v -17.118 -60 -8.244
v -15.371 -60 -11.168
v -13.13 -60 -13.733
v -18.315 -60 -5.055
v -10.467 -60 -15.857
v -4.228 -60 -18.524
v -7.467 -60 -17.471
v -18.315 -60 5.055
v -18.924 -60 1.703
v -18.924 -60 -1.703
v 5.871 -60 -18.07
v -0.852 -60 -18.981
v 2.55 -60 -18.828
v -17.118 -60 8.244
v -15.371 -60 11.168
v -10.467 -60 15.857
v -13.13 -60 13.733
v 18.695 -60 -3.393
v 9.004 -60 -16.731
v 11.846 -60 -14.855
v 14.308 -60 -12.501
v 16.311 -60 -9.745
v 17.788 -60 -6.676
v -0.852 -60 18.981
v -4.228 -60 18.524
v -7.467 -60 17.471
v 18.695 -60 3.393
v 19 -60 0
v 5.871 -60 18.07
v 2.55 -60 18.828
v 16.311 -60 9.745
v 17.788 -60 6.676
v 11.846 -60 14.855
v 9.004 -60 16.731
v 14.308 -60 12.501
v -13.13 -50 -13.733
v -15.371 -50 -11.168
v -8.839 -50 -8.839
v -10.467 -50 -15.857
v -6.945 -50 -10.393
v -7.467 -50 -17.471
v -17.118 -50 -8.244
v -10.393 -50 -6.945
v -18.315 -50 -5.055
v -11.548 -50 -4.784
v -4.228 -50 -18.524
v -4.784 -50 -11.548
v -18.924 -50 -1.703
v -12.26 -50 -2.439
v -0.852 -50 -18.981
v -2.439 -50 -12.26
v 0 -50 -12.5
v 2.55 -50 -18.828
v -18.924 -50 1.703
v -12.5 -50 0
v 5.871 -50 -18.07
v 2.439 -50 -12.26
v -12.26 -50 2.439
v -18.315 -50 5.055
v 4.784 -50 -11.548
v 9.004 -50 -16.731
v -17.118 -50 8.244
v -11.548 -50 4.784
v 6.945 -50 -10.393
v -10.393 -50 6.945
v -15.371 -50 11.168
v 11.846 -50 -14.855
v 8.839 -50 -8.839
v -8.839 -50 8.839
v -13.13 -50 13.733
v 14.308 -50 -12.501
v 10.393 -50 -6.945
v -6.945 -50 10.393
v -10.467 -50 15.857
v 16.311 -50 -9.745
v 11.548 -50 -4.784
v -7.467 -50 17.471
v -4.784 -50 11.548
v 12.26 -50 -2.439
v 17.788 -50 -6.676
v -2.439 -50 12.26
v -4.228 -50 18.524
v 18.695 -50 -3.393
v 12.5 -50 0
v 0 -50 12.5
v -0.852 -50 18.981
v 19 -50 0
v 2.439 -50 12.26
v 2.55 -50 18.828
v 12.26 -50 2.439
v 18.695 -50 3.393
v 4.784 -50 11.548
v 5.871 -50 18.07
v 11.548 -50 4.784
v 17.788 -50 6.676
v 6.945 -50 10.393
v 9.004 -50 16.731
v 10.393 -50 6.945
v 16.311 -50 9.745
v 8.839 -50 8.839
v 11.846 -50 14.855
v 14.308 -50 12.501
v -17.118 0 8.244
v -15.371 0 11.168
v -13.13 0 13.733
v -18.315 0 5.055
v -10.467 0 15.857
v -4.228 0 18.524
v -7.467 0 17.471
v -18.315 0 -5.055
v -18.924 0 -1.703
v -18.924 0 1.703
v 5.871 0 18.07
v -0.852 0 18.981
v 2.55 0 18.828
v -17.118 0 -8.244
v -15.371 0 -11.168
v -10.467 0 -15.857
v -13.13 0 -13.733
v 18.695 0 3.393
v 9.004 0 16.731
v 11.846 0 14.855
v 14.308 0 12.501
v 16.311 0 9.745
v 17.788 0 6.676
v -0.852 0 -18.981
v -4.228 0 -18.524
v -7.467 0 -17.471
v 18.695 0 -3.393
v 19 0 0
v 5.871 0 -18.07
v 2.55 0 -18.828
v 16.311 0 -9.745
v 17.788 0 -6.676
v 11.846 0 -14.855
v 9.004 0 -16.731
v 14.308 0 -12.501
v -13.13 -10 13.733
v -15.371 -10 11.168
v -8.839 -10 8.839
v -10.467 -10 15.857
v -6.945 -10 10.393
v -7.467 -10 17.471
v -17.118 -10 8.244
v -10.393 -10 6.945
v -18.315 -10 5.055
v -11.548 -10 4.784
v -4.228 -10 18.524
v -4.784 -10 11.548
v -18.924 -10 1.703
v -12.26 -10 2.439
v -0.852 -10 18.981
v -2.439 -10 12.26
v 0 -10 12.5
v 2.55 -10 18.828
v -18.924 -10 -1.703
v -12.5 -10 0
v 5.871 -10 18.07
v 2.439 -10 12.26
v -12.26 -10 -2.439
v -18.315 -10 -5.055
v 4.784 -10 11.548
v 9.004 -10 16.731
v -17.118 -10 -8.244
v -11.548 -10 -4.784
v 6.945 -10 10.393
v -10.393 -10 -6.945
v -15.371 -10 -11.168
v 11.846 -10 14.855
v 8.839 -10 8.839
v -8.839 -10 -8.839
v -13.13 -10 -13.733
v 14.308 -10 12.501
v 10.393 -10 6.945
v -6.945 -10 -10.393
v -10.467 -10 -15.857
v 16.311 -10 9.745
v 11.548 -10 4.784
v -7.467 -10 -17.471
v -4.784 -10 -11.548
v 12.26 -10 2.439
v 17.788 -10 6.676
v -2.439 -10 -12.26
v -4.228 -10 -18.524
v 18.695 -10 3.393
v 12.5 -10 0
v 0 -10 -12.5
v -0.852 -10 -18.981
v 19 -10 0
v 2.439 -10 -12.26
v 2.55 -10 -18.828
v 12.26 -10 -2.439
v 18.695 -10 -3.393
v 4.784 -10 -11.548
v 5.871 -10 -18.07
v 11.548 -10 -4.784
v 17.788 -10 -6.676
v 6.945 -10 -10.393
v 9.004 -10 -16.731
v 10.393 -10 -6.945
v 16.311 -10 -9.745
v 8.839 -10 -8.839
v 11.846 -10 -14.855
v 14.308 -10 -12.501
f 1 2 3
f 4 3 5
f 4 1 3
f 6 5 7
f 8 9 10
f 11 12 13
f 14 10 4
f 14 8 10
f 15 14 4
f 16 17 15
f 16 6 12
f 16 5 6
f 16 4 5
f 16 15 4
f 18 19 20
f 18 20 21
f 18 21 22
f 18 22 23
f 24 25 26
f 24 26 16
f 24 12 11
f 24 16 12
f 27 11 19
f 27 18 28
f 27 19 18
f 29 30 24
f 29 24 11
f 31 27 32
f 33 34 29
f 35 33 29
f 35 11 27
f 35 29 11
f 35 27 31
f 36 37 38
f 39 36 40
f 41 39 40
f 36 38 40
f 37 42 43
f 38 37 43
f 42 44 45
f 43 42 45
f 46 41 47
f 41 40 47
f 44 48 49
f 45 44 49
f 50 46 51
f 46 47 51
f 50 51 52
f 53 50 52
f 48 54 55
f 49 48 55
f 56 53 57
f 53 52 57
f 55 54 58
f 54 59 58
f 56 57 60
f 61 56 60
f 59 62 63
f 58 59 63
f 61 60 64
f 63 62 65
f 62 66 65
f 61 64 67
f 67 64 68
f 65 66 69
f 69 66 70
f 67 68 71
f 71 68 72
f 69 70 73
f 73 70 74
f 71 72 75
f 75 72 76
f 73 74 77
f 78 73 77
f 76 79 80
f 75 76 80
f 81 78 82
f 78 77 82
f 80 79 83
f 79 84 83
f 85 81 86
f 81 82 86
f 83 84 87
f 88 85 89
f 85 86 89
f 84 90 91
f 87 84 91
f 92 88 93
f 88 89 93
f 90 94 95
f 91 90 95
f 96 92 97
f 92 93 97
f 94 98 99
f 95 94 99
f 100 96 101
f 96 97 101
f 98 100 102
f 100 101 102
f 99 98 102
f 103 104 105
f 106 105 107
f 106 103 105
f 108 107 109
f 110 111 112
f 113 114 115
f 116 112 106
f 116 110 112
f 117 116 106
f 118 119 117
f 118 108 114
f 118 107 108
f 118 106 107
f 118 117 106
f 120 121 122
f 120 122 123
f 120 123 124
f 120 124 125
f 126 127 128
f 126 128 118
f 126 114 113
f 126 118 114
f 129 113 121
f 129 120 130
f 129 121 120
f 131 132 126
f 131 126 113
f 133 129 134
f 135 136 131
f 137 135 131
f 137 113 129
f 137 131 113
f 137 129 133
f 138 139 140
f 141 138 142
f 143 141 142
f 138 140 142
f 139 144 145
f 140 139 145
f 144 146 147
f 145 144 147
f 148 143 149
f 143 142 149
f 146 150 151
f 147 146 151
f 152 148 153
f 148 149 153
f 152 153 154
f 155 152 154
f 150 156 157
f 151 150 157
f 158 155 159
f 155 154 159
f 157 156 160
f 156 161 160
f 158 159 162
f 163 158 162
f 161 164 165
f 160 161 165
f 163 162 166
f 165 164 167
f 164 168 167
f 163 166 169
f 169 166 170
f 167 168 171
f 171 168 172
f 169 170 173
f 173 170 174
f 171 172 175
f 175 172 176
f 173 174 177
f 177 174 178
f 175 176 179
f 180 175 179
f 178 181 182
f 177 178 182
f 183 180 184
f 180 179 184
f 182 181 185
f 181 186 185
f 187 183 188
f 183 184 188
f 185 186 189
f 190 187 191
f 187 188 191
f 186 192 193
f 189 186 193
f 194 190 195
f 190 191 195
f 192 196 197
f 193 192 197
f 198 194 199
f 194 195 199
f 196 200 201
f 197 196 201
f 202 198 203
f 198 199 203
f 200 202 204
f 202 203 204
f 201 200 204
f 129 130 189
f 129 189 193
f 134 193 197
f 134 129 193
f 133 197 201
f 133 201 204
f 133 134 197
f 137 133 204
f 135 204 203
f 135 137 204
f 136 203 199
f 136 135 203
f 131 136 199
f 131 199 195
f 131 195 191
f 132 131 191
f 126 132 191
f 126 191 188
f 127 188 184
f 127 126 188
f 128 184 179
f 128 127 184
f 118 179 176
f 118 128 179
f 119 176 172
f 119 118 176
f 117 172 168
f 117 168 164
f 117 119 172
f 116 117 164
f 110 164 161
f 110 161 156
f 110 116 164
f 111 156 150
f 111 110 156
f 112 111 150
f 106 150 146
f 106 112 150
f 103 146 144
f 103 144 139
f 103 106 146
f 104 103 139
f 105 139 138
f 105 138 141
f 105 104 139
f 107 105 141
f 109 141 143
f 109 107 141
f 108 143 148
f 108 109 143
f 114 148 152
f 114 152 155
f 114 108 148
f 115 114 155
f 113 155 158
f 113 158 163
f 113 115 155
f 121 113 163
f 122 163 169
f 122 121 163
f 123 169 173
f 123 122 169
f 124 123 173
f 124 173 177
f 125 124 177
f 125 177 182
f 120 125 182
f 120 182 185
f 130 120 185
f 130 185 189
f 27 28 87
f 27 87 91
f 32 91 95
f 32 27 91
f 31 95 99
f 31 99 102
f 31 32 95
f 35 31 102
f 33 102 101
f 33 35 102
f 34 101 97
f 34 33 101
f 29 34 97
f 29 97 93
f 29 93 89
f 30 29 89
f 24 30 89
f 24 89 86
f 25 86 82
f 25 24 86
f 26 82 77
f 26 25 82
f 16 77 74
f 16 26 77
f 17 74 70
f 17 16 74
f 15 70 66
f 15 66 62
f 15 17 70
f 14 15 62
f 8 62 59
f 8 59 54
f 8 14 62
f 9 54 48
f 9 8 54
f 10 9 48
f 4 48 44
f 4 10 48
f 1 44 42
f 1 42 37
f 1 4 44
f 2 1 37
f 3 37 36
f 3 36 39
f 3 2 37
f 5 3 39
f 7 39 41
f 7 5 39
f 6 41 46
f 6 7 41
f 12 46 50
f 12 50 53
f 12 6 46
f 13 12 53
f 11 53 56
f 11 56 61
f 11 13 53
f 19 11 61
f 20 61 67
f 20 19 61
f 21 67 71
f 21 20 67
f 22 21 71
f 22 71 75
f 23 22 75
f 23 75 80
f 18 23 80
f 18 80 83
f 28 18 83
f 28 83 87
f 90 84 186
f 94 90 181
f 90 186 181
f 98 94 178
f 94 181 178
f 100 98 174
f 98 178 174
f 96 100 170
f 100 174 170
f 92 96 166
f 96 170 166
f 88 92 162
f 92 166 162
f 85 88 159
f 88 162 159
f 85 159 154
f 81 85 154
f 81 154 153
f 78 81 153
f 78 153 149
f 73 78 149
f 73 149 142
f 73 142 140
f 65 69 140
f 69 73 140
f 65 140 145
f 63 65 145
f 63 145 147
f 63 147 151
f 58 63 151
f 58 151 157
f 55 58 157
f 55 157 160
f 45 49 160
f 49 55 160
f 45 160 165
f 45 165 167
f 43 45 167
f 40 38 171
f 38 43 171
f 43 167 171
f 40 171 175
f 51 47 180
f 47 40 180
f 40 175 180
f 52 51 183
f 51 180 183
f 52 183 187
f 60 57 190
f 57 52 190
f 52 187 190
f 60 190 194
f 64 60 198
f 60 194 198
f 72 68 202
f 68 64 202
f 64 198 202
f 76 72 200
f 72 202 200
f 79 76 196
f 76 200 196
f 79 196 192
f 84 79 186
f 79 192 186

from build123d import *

# Parameters (mm, degrees)
SKETCH1_R           = 19
BOSS_EXTRUDE1_DEPTH = 10
SKETCH2_R           = 12.5
BOSS_EXTRUDE2_DEPTH = 50
SKETCH4_R           = 19
BOSS_EXTRUDE3_DEPTH = 10


with BuildPart() as part:
    # Sketch1 → Boss-Extrude1 (new body)
    with BuildSketch(Plane(origin=(0, 0, 0), x_dir=(1, 0, 0), z_dir=(0, 1, 0))):
        Circle(SKETCH1_R)
    extrude(amount=-BOSS_EXTRUDE1_DEPTH)

    # Sketch2 → Boss-Extrude2 (add)
    with BuildSketch(Plane.XZ.offset(10)):
        Circle(SKETCH2_R)
    extrude(amount=BOSS_EXTRUDE2_DEPTH)

    # Sketch4 → Boss-Extrude3 (add)
    with BuildSketch(Plane.XZ.offset(60)):
        Circle(SKETCH4_R)
    extrude(amount=-BOSS_EXTRUDE3_DEPTH)


solid = part.part
